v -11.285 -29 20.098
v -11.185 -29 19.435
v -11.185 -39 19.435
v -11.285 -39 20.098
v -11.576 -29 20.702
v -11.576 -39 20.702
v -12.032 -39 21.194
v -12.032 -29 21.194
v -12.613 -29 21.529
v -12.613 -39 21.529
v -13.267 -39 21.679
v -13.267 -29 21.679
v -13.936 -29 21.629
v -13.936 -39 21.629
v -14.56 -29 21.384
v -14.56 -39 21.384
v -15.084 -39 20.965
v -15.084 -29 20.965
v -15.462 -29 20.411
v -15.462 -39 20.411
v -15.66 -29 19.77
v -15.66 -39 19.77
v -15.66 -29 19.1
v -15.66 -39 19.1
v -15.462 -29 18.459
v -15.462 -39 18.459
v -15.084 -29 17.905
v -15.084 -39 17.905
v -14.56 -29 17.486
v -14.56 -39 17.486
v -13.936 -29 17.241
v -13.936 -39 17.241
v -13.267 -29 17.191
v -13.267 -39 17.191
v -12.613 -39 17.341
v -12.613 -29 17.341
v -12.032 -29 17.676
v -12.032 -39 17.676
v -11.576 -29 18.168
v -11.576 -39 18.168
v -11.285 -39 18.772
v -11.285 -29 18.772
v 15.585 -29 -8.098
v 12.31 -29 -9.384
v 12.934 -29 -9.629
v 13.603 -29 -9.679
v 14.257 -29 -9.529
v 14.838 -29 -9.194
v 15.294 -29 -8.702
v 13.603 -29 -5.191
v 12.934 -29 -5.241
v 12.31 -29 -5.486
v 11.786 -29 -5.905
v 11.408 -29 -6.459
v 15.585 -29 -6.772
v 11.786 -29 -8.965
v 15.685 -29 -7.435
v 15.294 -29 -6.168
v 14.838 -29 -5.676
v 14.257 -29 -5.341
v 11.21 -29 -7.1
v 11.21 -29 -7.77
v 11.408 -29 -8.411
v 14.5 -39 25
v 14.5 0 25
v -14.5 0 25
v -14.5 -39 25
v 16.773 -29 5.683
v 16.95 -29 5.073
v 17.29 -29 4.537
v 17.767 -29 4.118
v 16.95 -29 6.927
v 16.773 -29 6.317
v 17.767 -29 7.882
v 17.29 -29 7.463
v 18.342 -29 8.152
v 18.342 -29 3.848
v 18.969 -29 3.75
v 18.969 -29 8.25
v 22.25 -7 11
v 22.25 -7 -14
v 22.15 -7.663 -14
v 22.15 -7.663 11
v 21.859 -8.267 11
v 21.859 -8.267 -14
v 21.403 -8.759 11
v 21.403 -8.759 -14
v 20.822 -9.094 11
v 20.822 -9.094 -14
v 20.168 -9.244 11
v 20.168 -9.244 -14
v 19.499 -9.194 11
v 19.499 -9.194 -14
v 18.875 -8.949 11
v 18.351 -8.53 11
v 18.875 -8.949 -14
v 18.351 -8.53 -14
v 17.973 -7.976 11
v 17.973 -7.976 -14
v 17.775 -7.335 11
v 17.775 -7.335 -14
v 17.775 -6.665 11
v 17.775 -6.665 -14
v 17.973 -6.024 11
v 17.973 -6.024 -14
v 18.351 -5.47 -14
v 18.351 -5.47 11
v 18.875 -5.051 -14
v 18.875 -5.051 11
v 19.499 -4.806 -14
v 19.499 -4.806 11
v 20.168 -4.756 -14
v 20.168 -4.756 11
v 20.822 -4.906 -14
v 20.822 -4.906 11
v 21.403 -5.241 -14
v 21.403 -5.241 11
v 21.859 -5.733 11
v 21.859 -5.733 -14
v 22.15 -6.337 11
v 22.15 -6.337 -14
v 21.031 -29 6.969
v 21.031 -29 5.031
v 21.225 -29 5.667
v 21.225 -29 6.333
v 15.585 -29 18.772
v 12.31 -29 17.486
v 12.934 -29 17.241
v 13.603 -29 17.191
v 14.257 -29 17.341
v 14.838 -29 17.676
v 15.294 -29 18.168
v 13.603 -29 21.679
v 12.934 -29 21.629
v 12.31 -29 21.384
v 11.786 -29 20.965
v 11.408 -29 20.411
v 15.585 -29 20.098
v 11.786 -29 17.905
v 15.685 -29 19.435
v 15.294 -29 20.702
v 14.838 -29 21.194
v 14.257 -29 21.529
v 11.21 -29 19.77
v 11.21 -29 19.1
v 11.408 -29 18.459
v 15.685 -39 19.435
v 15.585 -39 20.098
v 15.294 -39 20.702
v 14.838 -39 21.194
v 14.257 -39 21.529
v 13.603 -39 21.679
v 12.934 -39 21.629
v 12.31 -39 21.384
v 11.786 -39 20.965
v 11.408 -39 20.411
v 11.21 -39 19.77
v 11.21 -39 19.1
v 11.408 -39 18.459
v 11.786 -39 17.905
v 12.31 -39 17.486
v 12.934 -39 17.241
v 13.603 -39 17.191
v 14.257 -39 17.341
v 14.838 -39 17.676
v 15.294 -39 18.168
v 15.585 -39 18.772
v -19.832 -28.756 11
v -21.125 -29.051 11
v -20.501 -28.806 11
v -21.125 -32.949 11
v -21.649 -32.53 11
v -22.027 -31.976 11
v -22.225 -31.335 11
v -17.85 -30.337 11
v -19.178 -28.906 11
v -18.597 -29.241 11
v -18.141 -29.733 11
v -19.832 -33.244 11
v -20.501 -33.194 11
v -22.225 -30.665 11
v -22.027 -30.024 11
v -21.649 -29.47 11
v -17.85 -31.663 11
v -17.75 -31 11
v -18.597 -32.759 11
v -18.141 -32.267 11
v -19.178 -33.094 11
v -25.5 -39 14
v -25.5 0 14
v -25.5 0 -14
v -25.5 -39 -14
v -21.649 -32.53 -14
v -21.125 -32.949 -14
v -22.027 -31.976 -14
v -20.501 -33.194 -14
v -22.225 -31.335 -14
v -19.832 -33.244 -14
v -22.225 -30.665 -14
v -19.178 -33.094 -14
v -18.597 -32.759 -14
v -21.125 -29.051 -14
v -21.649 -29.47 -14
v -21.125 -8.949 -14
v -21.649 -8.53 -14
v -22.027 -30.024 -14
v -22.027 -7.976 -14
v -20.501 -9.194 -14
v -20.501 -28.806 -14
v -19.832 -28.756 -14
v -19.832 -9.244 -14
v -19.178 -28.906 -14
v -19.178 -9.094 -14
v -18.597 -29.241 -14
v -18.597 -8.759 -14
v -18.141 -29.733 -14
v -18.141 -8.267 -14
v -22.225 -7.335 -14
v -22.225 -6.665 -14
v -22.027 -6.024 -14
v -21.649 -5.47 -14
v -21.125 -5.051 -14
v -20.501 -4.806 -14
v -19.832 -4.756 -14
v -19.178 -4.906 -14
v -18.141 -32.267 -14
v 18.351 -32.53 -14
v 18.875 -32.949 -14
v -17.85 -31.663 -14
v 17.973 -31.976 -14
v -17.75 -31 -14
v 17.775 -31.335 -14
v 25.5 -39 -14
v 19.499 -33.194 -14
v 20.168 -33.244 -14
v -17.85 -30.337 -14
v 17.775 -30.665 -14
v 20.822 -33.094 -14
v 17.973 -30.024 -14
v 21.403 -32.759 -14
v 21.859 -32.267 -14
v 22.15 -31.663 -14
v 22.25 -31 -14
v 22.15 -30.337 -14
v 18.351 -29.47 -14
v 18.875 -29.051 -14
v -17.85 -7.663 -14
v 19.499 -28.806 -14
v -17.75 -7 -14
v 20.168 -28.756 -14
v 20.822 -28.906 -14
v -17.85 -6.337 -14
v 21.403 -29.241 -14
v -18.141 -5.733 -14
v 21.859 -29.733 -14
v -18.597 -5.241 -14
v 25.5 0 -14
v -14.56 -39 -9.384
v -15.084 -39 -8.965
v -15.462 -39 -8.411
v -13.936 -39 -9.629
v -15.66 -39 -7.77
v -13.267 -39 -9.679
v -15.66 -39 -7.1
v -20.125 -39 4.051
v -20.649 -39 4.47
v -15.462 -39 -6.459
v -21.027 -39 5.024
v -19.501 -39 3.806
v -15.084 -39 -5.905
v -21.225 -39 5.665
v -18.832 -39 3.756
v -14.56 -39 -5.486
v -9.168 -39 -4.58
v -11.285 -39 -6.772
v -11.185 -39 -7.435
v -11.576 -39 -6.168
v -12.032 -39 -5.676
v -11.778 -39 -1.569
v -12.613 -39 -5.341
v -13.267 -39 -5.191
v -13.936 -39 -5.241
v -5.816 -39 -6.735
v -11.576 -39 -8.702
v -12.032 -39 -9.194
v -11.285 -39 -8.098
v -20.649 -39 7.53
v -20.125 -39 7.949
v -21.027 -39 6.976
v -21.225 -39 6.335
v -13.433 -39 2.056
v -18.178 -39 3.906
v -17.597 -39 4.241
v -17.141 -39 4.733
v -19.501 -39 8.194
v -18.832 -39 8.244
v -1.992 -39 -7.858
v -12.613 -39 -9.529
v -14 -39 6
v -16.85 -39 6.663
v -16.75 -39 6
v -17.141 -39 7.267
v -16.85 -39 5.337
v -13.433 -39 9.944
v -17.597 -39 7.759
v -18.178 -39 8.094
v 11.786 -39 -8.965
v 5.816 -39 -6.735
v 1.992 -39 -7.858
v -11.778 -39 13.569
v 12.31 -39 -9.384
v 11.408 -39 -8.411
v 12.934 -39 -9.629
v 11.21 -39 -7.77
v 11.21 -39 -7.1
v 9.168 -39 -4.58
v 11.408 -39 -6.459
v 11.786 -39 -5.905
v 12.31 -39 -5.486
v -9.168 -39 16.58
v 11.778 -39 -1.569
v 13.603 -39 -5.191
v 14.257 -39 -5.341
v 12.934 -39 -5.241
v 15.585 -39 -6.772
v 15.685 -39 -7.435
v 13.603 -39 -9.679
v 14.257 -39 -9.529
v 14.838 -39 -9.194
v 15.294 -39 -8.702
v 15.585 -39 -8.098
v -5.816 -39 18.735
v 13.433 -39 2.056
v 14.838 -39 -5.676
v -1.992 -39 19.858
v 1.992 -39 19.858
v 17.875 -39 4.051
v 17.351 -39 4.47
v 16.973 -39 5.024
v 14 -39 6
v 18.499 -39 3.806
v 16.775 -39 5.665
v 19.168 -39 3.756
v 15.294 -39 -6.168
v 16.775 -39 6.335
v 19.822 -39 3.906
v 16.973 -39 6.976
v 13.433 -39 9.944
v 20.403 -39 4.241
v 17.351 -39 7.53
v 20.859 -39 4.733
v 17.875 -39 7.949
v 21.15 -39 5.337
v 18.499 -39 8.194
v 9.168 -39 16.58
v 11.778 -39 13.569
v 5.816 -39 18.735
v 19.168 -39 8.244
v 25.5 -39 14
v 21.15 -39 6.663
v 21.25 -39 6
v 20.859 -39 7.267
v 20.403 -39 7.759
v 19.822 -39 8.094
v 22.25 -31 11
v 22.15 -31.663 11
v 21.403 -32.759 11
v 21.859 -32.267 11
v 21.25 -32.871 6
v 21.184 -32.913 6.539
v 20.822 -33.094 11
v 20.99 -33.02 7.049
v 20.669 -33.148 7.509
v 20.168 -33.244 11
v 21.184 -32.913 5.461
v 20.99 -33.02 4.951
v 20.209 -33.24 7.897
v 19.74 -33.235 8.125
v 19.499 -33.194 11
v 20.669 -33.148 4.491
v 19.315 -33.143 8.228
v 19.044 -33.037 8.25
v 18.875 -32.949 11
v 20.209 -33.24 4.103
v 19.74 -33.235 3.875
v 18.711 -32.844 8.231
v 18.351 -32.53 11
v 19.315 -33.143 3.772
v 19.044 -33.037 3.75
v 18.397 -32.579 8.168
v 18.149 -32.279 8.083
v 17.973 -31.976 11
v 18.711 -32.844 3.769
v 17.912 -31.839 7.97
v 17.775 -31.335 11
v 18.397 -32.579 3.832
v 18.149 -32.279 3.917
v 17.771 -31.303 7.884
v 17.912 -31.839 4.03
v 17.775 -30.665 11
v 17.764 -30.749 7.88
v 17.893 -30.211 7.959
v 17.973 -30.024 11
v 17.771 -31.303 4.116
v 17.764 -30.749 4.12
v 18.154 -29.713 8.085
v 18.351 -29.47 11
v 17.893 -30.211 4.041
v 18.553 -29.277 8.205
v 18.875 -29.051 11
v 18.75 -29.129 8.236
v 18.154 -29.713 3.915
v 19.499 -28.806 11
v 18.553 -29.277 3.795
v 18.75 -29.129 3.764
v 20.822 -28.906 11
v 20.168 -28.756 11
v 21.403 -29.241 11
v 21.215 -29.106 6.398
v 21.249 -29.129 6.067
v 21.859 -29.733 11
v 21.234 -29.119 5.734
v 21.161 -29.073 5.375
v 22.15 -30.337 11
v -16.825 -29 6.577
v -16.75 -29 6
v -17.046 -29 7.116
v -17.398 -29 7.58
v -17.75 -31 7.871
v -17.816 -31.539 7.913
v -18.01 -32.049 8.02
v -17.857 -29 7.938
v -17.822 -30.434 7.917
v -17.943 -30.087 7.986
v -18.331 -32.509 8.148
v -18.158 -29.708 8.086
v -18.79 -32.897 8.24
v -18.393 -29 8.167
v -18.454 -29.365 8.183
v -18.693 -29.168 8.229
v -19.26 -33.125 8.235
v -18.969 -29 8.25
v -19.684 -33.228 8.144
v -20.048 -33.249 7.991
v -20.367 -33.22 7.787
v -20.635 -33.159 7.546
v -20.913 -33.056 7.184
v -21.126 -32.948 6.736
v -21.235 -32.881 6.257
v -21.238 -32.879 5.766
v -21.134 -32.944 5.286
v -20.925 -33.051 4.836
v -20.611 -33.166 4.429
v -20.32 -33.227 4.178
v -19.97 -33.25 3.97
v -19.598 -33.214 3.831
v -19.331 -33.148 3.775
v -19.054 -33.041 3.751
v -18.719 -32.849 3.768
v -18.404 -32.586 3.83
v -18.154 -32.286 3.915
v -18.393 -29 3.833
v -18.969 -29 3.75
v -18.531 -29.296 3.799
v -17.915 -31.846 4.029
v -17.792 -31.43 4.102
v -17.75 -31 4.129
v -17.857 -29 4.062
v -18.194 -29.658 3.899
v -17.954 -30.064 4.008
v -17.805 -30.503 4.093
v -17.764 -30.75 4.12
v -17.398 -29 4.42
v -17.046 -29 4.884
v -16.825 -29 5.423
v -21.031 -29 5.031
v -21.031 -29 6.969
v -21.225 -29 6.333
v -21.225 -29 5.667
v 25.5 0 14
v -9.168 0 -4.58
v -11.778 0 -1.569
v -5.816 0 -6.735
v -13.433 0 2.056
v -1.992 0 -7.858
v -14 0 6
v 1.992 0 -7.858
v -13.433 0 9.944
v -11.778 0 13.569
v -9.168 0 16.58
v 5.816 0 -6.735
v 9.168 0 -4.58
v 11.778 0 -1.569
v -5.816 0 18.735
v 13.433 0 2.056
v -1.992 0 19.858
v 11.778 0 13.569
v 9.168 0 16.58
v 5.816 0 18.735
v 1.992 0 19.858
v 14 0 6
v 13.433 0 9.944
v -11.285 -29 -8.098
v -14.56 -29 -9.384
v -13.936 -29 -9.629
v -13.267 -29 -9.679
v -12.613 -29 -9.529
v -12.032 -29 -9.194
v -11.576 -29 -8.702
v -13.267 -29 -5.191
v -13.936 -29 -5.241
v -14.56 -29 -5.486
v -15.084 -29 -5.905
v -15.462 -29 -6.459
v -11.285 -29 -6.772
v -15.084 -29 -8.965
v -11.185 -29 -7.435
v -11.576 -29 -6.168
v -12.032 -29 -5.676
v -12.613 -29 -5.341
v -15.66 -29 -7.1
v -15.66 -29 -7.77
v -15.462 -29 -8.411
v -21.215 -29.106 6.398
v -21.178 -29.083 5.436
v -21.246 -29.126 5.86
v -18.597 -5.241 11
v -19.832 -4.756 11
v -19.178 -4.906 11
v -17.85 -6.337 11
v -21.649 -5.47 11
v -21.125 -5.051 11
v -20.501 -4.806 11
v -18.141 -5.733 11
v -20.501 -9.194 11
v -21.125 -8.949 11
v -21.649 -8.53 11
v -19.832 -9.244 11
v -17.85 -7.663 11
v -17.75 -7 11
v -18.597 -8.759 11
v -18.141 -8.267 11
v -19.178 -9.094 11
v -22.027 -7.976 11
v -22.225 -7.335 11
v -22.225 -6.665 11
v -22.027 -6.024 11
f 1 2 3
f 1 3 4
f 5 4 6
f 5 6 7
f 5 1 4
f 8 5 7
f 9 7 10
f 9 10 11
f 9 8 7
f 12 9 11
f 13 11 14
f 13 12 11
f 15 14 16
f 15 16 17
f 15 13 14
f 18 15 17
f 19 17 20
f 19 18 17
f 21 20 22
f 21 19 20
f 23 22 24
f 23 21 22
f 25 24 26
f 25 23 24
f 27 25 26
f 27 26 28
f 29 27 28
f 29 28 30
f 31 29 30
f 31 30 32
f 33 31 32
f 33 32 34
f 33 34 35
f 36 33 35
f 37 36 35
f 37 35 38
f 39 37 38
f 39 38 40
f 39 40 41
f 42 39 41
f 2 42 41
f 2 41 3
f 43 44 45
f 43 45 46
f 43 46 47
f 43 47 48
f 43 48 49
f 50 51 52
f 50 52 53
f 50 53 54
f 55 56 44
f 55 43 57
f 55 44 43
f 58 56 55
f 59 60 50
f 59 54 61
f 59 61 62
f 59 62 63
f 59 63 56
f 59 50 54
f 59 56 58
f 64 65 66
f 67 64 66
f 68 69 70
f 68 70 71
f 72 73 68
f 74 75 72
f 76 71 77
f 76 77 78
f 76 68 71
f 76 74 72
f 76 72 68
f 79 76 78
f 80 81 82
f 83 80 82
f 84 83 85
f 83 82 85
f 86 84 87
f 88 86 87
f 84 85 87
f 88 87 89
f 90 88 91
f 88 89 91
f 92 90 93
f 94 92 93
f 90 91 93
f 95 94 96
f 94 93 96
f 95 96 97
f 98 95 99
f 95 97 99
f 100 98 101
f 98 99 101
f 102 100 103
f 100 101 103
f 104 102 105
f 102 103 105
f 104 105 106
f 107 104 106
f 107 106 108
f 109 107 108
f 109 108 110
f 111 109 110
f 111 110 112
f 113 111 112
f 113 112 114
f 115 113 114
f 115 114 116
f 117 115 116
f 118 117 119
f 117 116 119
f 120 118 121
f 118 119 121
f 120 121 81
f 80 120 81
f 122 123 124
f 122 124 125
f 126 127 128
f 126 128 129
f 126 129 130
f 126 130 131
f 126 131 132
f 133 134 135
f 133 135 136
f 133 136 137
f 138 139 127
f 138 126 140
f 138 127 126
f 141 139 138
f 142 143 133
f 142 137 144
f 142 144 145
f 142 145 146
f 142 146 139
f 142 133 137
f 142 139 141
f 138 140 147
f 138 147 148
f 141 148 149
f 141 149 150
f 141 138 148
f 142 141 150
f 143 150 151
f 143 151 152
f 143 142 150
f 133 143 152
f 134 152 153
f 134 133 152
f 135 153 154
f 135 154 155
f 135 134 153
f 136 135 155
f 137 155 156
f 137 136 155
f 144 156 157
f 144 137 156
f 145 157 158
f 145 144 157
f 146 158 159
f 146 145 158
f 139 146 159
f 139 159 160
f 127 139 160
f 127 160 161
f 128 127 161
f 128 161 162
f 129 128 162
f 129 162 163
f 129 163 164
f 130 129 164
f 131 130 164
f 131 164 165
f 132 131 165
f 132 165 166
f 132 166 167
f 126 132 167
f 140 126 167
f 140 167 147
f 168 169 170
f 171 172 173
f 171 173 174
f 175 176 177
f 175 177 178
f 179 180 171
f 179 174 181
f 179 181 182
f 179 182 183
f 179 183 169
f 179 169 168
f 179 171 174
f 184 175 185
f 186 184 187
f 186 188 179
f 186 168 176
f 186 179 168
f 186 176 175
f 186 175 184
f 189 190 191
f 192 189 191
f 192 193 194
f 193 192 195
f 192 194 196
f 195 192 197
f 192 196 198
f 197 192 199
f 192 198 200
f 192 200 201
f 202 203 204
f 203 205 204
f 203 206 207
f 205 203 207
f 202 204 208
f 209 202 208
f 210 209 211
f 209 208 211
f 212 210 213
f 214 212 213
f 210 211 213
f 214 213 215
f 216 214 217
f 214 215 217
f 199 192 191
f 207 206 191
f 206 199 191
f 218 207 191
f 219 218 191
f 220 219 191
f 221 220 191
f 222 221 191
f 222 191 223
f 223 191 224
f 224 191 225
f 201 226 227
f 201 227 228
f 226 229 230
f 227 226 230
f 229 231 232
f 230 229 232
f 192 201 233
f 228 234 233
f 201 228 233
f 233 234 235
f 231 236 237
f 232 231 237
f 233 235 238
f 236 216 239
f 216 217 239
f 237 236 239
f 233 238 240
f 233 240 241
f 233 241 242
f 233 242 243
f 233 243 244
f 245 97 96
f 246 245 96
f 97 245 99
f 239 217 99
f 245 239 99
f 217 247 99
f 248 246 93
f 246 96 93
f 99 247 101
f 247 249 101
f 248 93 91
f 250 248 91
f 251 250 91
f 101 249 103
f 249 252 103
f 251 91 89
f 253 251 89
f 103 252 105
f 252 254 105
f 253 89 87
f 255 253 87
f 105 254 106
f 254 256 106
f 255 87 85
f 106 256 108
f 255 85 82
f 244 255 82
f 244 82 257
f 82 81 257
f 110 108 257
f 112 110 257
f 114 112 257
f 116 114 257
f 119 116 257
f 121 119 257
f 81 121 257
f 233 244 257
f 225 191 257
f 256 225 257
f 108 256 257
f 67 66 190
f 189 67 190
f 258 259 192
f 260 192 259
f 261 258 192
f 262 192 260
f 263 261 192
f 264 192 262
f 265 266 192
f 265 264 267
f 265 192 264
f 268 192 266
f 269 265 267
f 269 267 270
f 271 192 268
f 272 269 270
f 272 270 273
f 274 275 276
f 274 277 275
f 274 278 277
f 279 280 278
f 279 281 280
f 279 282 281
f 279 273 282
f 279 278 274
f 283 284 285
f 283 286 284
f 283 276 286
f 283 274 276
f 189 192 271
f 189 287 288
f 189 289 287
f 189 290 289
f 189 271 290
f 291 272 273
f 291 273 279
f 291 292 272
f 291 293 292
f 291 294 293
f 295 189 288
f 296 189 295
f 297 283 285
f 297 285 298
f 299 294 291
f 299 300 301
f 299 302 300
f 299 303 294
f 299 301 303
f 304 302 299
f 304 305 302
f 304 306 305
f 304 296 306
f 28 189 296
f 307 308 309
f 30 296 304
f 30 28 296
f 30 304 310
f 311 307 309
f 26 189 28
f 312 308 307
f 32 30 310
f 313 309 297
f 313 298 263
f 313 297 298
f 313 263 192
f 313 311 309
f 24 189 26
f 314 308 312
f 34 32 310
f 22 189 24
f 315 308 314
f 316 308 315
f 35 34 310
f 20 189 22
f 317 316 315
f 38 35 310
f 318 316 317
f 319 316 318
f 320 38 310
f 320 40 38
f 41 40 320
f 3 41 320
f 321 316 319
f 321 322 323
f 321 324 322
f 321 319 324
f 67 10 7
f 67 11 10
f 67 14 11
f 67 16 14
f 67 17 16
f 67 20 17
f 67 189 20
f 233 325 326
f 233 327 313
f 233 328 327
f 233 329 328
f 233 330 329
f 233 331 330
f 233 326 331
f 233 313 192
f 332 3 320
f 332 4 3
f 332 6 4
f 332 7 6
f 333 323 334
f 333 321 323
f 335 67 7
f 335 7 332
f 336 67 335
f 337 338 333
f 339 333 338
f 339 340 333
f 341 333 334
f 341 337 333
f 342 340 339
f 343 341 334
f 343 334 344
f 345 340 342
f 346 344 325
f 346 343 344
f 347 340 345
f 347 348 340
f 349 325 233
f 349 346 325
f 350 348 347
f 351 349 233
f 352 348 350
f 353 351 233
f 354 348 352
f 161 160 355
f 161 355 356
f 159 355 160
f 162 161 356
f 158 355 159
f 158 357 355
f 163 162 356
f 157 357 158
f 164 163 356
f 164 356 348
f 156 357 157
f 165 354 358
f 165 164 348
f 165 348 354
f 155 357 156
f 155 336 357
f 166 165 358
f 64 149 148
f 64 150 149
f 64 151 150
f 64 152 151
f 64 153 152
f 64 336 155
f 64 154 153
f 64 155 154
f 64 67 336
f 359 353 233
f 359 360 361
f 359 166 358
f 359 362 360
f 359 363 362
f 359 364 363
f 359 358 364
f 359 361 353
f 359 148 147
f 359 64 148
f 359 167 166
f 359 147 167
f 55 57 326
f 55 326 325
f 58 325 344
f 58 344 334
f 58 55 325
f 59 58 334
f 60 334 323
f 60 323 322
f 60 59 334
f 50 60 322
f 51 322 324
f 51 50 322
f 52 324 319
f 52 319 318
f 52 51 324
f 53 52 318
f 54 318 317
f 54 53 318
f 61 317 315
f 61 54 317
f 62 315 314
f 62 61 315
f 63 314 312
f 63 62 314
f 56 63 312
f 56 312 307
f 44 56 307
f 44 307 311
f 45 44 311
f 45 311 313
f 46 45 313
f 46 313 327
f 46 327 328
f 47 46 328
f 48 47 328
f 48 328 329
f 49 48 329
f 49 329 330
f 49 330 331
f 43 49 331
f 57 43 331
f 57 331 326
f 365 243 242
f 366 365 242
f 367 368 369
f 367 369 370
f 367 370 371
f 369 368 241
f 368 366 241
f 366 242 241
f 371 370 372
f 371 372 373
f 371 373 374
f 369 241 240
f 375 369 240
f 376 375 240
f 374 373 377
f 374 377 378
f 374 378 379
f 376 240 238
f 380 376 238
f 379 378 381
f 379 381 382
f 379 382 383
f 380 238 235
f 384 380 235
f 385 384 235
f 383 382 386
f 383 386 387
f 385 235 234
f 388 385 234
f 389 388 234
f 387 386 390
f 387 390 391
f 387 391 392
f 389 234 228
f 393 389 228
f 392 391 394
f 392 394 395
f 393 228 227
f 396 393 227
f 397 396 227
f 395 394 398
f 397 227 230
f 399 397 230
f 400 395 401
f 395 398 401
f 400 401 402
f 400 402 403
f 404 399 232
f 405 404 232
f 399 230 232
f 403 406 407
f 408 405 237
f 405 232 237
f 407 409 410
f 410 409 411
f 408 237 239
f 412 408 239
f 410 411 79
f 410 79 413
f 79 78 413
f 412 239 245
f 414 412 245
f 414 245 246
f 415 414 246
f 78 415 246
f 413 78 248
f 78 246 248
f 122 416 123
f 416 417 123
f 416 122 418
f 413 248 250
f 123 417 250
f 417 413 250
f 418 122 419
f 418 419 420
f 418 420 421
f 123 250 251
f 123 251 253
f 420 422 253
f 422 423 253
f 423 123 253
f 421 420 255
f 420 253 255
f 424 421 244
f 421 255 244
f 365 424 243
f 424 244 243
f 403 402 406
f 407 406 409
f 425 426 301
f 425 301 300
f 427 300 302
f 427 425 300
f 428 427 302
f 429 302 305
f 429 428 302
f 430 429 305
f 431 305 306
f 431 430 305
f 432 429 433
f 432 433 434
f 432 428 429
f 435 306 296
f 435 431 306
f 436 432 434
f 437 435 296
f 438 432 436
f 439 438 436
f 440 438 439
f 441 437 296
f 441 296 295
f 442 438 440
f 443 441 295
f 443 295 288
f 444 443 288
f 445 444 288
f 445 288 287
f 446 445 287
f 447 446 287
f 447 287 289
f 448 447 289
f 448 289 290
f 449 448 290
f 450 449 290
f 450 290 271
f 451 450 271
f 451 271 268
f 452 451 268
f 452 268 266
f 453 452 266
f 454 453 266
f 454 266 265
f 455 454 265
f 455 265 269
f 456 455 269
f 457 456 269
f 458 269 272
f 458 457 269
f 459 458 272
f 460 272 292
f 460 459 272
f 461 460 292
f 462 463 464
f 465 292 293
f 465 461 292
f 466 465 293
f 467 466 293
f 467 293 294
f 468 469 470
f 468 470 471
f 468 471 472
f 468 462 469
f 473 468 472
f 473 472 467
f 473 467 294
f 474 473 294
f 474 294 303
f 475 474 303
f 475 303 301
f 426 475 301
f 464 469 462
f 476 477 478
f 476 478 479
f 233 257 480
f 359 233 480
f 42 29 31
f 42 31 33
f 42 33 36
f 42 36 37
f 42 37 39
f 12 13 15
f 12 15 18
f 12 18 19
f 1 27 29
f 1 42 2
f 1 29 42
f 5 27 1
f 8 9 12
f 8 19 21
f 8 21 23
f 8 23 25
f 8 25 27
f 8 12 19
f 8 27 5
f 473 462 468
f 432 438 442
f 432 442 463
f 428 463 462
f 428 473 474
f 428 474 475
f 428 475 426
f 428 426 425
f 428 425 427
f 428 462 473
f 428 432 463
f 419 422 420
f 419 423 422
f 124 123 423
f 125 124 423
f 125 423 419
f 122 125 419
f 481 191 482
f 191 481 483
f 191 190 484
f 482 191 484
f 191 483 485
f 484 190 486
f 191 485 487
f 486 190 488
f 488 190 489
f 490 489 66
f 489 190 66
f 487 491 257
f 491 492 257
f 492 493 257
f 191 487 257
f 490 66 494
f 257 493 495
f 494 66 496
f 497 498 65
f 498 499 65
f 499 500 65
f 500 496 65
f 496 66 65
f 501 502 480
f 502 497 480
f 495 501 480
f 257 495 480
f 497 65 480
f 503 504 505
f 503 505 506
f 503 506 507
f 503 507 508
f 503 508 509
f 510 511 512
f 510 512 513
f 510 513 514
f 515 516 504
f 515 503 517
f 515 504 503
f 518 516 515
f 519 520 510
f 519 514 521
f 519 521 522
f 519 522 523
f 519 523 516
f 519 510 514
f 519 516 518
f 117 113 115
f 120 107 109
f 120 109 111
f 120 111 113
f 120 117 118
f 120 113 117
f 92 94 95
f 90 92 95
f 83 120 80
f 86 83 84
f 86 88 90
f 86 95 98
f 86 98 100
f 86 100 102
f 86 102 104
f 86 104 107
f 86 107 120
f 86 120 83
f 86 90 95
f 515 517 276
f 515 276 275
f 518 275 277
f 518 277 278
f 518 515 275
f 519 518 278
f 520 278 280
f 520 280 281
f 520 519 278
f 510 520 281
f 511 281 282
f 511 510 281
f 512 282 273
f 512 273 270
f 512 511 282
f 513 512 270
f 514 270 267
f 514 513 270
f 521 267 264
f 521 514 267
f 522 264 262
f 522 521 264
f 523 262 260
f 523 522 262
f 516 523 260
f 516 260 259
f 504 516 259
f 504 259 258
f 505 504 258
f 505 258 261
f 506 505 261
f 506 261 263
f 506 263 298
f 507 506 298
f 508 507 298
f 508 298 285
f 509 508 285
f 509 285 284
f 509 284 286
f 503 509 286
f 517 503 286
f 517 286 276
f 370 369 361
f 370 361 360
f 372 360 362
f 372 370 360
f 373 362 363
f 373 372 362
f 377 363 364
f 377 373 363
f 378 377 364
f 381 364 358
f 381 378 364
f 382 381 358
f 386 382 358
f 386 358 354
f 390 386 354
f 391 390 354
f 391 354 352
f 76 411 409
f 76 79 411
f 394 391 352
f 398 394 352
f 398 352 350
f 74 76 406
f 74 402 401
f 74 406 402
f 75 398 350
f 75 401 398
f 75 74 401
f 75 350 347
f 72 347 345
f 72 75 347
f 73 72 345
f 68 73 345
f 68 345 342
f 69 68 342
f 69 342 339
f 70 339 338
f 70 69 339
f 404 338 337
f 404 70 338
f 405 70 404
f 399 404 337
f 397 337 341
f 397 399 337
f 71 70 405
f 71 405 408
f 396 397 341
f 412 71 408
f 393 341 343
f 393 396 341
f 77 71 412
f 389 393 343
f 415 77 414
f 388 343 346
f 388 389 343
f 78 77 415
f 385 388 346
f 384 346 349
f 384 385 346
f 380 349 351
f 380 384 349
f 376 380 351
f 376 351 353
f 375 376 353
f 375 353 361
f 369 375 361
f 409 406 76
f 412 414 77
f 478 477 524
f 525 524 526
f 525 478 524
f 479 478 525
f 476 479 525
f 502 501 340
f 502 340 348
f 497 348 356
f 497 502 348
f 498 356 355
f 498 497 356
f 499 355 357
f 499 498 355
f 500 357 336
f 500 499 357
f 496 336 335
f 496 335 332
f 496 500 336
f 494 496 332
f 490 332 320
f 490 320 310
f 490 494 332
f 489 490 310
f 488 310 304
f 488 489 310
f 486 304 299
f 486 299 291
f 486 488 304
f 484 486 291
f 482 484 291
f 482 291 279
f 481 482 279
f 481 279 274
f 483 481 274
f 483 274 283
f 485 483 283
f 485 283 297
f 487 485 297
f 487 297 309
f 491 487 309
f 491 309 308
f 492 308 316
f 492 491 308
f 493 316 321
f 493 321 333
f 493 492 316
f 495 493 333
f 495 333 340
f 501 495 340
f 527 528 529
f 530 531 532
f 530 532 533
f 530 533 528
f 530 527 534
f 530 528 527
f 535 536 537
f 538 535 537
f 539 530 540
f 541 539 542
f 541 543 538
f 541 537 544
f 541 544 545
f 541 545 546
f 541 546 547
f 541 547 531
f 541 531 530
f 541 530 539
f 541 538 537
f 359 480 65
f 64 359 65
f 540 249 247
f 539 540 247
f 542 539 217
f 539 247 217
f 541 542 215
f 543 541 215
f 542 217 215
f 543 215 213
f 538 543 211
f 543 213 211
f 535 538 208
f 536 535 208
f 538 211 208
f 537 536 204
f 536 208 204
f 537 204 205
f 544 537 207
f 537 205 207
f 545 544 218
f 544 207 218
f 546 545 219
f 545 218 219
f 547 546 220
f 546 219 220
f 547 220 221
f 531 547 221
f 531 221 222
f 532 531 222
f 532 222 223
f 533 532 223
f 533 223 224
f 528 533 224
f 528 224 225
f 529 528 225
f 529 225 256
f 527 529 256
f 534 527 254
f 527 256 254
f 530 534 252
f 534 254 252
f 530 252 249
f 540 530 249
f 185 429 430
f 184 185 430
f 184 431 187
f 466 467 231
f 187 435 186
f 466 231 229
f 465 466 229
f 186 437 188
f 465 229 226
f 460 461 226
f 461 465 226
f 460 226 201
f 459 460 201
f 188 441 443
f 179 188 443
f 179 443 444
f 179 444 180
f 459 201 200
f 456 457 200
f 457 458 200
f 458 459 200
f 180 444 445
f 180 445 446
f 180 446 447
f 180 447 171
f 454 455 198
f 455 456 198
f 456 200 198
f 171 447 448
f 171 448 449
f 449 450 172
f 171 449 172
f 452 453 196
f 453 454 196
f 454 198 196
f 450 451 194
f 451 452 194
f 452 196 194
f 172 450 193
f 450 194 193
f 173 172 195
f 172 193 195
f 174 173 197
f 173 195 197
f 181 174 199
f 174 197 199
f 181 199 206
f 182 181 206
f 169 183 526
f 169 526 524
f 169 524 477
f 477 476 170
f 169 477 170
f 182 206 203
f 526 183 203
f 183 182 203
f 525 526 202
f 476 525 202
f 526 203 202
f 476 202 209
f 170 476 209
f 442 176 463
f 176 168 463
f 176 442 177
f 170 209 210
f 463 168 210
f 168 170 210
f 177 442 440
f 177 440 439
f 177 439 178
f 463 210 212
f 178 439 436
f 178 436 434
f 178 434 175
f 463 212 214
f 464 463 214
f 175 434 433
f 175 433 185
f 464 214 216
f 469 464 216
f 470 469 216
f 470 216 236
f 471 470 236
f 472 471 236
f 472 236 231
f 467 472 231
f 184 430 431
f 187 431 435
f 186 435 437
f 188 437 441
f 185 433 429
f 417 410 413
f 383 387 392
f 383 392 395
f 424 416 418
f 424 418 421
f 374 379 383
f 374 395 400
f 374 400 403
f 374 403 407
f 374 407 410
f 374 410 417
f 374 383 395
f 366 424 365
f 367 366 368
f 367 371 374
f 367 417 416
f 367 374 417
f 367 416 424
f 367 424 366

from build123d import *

# Parameters (mm, degrees)
F0_R     = 2.25
F0_R_2   = 14
F2_DEPTH = 39
F3_DEPTH = 29
F1_R     = 2.25
F4_DEPTH = 25


with BuildPart() as f2:
    # F0 (on Front) → F2 (new body)
    with BuildSketch(Plane.XZ):
        Polygon((-25.5, -14), (25.5, -14), (25.5, 14), (14.5, 25), (-14.5, 25), (-25.5, 14), align=None)
        with Locations((-13.435029, -7.435029)):
            Circle(F0_R, mode=Mode.SUBTRACT)
        with Locations((13.435029, -7.435029)):
            Circle(F0_R, mode=Mode.SUBTRACT)
        with Locations((-19, 6)):
            Circle(F0_R, mode=Mode.SUBTRACT)
        with Locations((-13.435029, 19.435029)):
            Circle(F0_R, mode=Mode.SUBTRACT)
        with Locations((0, 6)):
            Circle(F0_R_2, mode=Mode.SUBTRACT)
        with Locations((19, 6)):
            Circle(F0_R, mode=Mode.SUBTRACT)
        with Locations((13.435029, 19.435029)):
            Circle(F0_R, mode=Mode.SUBTRACT)
    extrude(amount=F2_DEPTH)

    # F0 (on Front) → F3 (join)
    with BuildSketch(Plane.XZ):
        with Locations((19, 6)):
            Circle(F0_R)
        with Locations((13.435029, 19.435029)):
            Circle(F0_R)
        with Locations((13.435029, -7.435029)):
            Circle(F0_R)
        with Locations((-13.435029, -7.435029)):
            Circle(F0_R)
        with Locations((-19, 6)):
            Circle(F0_R)
        with Locations((-13.435029, 19.435029)):
            Circle(F0_R)
    extrude(amount=F3_DEPTH)

    # F1 (on face) → F4 (cut)
    with BuildSketch(Plane(origin=(0, 0, -14), x_dir=(1, 0, 0), z_dir=(0, 0, -1))):
        with Locations((-20, 7)):
            Circle(F1_R)
        with Locations((-20, 31)):
            Circle(F1_R)
        with Locations((20, 31)):
            Circle(F1_R)
        with Locations((20, 7)):
            Circle(F1_R)
    extrude(amount=-F4_DEPTH, mode=Mode.SUBTRACT)


solid = f2.part
